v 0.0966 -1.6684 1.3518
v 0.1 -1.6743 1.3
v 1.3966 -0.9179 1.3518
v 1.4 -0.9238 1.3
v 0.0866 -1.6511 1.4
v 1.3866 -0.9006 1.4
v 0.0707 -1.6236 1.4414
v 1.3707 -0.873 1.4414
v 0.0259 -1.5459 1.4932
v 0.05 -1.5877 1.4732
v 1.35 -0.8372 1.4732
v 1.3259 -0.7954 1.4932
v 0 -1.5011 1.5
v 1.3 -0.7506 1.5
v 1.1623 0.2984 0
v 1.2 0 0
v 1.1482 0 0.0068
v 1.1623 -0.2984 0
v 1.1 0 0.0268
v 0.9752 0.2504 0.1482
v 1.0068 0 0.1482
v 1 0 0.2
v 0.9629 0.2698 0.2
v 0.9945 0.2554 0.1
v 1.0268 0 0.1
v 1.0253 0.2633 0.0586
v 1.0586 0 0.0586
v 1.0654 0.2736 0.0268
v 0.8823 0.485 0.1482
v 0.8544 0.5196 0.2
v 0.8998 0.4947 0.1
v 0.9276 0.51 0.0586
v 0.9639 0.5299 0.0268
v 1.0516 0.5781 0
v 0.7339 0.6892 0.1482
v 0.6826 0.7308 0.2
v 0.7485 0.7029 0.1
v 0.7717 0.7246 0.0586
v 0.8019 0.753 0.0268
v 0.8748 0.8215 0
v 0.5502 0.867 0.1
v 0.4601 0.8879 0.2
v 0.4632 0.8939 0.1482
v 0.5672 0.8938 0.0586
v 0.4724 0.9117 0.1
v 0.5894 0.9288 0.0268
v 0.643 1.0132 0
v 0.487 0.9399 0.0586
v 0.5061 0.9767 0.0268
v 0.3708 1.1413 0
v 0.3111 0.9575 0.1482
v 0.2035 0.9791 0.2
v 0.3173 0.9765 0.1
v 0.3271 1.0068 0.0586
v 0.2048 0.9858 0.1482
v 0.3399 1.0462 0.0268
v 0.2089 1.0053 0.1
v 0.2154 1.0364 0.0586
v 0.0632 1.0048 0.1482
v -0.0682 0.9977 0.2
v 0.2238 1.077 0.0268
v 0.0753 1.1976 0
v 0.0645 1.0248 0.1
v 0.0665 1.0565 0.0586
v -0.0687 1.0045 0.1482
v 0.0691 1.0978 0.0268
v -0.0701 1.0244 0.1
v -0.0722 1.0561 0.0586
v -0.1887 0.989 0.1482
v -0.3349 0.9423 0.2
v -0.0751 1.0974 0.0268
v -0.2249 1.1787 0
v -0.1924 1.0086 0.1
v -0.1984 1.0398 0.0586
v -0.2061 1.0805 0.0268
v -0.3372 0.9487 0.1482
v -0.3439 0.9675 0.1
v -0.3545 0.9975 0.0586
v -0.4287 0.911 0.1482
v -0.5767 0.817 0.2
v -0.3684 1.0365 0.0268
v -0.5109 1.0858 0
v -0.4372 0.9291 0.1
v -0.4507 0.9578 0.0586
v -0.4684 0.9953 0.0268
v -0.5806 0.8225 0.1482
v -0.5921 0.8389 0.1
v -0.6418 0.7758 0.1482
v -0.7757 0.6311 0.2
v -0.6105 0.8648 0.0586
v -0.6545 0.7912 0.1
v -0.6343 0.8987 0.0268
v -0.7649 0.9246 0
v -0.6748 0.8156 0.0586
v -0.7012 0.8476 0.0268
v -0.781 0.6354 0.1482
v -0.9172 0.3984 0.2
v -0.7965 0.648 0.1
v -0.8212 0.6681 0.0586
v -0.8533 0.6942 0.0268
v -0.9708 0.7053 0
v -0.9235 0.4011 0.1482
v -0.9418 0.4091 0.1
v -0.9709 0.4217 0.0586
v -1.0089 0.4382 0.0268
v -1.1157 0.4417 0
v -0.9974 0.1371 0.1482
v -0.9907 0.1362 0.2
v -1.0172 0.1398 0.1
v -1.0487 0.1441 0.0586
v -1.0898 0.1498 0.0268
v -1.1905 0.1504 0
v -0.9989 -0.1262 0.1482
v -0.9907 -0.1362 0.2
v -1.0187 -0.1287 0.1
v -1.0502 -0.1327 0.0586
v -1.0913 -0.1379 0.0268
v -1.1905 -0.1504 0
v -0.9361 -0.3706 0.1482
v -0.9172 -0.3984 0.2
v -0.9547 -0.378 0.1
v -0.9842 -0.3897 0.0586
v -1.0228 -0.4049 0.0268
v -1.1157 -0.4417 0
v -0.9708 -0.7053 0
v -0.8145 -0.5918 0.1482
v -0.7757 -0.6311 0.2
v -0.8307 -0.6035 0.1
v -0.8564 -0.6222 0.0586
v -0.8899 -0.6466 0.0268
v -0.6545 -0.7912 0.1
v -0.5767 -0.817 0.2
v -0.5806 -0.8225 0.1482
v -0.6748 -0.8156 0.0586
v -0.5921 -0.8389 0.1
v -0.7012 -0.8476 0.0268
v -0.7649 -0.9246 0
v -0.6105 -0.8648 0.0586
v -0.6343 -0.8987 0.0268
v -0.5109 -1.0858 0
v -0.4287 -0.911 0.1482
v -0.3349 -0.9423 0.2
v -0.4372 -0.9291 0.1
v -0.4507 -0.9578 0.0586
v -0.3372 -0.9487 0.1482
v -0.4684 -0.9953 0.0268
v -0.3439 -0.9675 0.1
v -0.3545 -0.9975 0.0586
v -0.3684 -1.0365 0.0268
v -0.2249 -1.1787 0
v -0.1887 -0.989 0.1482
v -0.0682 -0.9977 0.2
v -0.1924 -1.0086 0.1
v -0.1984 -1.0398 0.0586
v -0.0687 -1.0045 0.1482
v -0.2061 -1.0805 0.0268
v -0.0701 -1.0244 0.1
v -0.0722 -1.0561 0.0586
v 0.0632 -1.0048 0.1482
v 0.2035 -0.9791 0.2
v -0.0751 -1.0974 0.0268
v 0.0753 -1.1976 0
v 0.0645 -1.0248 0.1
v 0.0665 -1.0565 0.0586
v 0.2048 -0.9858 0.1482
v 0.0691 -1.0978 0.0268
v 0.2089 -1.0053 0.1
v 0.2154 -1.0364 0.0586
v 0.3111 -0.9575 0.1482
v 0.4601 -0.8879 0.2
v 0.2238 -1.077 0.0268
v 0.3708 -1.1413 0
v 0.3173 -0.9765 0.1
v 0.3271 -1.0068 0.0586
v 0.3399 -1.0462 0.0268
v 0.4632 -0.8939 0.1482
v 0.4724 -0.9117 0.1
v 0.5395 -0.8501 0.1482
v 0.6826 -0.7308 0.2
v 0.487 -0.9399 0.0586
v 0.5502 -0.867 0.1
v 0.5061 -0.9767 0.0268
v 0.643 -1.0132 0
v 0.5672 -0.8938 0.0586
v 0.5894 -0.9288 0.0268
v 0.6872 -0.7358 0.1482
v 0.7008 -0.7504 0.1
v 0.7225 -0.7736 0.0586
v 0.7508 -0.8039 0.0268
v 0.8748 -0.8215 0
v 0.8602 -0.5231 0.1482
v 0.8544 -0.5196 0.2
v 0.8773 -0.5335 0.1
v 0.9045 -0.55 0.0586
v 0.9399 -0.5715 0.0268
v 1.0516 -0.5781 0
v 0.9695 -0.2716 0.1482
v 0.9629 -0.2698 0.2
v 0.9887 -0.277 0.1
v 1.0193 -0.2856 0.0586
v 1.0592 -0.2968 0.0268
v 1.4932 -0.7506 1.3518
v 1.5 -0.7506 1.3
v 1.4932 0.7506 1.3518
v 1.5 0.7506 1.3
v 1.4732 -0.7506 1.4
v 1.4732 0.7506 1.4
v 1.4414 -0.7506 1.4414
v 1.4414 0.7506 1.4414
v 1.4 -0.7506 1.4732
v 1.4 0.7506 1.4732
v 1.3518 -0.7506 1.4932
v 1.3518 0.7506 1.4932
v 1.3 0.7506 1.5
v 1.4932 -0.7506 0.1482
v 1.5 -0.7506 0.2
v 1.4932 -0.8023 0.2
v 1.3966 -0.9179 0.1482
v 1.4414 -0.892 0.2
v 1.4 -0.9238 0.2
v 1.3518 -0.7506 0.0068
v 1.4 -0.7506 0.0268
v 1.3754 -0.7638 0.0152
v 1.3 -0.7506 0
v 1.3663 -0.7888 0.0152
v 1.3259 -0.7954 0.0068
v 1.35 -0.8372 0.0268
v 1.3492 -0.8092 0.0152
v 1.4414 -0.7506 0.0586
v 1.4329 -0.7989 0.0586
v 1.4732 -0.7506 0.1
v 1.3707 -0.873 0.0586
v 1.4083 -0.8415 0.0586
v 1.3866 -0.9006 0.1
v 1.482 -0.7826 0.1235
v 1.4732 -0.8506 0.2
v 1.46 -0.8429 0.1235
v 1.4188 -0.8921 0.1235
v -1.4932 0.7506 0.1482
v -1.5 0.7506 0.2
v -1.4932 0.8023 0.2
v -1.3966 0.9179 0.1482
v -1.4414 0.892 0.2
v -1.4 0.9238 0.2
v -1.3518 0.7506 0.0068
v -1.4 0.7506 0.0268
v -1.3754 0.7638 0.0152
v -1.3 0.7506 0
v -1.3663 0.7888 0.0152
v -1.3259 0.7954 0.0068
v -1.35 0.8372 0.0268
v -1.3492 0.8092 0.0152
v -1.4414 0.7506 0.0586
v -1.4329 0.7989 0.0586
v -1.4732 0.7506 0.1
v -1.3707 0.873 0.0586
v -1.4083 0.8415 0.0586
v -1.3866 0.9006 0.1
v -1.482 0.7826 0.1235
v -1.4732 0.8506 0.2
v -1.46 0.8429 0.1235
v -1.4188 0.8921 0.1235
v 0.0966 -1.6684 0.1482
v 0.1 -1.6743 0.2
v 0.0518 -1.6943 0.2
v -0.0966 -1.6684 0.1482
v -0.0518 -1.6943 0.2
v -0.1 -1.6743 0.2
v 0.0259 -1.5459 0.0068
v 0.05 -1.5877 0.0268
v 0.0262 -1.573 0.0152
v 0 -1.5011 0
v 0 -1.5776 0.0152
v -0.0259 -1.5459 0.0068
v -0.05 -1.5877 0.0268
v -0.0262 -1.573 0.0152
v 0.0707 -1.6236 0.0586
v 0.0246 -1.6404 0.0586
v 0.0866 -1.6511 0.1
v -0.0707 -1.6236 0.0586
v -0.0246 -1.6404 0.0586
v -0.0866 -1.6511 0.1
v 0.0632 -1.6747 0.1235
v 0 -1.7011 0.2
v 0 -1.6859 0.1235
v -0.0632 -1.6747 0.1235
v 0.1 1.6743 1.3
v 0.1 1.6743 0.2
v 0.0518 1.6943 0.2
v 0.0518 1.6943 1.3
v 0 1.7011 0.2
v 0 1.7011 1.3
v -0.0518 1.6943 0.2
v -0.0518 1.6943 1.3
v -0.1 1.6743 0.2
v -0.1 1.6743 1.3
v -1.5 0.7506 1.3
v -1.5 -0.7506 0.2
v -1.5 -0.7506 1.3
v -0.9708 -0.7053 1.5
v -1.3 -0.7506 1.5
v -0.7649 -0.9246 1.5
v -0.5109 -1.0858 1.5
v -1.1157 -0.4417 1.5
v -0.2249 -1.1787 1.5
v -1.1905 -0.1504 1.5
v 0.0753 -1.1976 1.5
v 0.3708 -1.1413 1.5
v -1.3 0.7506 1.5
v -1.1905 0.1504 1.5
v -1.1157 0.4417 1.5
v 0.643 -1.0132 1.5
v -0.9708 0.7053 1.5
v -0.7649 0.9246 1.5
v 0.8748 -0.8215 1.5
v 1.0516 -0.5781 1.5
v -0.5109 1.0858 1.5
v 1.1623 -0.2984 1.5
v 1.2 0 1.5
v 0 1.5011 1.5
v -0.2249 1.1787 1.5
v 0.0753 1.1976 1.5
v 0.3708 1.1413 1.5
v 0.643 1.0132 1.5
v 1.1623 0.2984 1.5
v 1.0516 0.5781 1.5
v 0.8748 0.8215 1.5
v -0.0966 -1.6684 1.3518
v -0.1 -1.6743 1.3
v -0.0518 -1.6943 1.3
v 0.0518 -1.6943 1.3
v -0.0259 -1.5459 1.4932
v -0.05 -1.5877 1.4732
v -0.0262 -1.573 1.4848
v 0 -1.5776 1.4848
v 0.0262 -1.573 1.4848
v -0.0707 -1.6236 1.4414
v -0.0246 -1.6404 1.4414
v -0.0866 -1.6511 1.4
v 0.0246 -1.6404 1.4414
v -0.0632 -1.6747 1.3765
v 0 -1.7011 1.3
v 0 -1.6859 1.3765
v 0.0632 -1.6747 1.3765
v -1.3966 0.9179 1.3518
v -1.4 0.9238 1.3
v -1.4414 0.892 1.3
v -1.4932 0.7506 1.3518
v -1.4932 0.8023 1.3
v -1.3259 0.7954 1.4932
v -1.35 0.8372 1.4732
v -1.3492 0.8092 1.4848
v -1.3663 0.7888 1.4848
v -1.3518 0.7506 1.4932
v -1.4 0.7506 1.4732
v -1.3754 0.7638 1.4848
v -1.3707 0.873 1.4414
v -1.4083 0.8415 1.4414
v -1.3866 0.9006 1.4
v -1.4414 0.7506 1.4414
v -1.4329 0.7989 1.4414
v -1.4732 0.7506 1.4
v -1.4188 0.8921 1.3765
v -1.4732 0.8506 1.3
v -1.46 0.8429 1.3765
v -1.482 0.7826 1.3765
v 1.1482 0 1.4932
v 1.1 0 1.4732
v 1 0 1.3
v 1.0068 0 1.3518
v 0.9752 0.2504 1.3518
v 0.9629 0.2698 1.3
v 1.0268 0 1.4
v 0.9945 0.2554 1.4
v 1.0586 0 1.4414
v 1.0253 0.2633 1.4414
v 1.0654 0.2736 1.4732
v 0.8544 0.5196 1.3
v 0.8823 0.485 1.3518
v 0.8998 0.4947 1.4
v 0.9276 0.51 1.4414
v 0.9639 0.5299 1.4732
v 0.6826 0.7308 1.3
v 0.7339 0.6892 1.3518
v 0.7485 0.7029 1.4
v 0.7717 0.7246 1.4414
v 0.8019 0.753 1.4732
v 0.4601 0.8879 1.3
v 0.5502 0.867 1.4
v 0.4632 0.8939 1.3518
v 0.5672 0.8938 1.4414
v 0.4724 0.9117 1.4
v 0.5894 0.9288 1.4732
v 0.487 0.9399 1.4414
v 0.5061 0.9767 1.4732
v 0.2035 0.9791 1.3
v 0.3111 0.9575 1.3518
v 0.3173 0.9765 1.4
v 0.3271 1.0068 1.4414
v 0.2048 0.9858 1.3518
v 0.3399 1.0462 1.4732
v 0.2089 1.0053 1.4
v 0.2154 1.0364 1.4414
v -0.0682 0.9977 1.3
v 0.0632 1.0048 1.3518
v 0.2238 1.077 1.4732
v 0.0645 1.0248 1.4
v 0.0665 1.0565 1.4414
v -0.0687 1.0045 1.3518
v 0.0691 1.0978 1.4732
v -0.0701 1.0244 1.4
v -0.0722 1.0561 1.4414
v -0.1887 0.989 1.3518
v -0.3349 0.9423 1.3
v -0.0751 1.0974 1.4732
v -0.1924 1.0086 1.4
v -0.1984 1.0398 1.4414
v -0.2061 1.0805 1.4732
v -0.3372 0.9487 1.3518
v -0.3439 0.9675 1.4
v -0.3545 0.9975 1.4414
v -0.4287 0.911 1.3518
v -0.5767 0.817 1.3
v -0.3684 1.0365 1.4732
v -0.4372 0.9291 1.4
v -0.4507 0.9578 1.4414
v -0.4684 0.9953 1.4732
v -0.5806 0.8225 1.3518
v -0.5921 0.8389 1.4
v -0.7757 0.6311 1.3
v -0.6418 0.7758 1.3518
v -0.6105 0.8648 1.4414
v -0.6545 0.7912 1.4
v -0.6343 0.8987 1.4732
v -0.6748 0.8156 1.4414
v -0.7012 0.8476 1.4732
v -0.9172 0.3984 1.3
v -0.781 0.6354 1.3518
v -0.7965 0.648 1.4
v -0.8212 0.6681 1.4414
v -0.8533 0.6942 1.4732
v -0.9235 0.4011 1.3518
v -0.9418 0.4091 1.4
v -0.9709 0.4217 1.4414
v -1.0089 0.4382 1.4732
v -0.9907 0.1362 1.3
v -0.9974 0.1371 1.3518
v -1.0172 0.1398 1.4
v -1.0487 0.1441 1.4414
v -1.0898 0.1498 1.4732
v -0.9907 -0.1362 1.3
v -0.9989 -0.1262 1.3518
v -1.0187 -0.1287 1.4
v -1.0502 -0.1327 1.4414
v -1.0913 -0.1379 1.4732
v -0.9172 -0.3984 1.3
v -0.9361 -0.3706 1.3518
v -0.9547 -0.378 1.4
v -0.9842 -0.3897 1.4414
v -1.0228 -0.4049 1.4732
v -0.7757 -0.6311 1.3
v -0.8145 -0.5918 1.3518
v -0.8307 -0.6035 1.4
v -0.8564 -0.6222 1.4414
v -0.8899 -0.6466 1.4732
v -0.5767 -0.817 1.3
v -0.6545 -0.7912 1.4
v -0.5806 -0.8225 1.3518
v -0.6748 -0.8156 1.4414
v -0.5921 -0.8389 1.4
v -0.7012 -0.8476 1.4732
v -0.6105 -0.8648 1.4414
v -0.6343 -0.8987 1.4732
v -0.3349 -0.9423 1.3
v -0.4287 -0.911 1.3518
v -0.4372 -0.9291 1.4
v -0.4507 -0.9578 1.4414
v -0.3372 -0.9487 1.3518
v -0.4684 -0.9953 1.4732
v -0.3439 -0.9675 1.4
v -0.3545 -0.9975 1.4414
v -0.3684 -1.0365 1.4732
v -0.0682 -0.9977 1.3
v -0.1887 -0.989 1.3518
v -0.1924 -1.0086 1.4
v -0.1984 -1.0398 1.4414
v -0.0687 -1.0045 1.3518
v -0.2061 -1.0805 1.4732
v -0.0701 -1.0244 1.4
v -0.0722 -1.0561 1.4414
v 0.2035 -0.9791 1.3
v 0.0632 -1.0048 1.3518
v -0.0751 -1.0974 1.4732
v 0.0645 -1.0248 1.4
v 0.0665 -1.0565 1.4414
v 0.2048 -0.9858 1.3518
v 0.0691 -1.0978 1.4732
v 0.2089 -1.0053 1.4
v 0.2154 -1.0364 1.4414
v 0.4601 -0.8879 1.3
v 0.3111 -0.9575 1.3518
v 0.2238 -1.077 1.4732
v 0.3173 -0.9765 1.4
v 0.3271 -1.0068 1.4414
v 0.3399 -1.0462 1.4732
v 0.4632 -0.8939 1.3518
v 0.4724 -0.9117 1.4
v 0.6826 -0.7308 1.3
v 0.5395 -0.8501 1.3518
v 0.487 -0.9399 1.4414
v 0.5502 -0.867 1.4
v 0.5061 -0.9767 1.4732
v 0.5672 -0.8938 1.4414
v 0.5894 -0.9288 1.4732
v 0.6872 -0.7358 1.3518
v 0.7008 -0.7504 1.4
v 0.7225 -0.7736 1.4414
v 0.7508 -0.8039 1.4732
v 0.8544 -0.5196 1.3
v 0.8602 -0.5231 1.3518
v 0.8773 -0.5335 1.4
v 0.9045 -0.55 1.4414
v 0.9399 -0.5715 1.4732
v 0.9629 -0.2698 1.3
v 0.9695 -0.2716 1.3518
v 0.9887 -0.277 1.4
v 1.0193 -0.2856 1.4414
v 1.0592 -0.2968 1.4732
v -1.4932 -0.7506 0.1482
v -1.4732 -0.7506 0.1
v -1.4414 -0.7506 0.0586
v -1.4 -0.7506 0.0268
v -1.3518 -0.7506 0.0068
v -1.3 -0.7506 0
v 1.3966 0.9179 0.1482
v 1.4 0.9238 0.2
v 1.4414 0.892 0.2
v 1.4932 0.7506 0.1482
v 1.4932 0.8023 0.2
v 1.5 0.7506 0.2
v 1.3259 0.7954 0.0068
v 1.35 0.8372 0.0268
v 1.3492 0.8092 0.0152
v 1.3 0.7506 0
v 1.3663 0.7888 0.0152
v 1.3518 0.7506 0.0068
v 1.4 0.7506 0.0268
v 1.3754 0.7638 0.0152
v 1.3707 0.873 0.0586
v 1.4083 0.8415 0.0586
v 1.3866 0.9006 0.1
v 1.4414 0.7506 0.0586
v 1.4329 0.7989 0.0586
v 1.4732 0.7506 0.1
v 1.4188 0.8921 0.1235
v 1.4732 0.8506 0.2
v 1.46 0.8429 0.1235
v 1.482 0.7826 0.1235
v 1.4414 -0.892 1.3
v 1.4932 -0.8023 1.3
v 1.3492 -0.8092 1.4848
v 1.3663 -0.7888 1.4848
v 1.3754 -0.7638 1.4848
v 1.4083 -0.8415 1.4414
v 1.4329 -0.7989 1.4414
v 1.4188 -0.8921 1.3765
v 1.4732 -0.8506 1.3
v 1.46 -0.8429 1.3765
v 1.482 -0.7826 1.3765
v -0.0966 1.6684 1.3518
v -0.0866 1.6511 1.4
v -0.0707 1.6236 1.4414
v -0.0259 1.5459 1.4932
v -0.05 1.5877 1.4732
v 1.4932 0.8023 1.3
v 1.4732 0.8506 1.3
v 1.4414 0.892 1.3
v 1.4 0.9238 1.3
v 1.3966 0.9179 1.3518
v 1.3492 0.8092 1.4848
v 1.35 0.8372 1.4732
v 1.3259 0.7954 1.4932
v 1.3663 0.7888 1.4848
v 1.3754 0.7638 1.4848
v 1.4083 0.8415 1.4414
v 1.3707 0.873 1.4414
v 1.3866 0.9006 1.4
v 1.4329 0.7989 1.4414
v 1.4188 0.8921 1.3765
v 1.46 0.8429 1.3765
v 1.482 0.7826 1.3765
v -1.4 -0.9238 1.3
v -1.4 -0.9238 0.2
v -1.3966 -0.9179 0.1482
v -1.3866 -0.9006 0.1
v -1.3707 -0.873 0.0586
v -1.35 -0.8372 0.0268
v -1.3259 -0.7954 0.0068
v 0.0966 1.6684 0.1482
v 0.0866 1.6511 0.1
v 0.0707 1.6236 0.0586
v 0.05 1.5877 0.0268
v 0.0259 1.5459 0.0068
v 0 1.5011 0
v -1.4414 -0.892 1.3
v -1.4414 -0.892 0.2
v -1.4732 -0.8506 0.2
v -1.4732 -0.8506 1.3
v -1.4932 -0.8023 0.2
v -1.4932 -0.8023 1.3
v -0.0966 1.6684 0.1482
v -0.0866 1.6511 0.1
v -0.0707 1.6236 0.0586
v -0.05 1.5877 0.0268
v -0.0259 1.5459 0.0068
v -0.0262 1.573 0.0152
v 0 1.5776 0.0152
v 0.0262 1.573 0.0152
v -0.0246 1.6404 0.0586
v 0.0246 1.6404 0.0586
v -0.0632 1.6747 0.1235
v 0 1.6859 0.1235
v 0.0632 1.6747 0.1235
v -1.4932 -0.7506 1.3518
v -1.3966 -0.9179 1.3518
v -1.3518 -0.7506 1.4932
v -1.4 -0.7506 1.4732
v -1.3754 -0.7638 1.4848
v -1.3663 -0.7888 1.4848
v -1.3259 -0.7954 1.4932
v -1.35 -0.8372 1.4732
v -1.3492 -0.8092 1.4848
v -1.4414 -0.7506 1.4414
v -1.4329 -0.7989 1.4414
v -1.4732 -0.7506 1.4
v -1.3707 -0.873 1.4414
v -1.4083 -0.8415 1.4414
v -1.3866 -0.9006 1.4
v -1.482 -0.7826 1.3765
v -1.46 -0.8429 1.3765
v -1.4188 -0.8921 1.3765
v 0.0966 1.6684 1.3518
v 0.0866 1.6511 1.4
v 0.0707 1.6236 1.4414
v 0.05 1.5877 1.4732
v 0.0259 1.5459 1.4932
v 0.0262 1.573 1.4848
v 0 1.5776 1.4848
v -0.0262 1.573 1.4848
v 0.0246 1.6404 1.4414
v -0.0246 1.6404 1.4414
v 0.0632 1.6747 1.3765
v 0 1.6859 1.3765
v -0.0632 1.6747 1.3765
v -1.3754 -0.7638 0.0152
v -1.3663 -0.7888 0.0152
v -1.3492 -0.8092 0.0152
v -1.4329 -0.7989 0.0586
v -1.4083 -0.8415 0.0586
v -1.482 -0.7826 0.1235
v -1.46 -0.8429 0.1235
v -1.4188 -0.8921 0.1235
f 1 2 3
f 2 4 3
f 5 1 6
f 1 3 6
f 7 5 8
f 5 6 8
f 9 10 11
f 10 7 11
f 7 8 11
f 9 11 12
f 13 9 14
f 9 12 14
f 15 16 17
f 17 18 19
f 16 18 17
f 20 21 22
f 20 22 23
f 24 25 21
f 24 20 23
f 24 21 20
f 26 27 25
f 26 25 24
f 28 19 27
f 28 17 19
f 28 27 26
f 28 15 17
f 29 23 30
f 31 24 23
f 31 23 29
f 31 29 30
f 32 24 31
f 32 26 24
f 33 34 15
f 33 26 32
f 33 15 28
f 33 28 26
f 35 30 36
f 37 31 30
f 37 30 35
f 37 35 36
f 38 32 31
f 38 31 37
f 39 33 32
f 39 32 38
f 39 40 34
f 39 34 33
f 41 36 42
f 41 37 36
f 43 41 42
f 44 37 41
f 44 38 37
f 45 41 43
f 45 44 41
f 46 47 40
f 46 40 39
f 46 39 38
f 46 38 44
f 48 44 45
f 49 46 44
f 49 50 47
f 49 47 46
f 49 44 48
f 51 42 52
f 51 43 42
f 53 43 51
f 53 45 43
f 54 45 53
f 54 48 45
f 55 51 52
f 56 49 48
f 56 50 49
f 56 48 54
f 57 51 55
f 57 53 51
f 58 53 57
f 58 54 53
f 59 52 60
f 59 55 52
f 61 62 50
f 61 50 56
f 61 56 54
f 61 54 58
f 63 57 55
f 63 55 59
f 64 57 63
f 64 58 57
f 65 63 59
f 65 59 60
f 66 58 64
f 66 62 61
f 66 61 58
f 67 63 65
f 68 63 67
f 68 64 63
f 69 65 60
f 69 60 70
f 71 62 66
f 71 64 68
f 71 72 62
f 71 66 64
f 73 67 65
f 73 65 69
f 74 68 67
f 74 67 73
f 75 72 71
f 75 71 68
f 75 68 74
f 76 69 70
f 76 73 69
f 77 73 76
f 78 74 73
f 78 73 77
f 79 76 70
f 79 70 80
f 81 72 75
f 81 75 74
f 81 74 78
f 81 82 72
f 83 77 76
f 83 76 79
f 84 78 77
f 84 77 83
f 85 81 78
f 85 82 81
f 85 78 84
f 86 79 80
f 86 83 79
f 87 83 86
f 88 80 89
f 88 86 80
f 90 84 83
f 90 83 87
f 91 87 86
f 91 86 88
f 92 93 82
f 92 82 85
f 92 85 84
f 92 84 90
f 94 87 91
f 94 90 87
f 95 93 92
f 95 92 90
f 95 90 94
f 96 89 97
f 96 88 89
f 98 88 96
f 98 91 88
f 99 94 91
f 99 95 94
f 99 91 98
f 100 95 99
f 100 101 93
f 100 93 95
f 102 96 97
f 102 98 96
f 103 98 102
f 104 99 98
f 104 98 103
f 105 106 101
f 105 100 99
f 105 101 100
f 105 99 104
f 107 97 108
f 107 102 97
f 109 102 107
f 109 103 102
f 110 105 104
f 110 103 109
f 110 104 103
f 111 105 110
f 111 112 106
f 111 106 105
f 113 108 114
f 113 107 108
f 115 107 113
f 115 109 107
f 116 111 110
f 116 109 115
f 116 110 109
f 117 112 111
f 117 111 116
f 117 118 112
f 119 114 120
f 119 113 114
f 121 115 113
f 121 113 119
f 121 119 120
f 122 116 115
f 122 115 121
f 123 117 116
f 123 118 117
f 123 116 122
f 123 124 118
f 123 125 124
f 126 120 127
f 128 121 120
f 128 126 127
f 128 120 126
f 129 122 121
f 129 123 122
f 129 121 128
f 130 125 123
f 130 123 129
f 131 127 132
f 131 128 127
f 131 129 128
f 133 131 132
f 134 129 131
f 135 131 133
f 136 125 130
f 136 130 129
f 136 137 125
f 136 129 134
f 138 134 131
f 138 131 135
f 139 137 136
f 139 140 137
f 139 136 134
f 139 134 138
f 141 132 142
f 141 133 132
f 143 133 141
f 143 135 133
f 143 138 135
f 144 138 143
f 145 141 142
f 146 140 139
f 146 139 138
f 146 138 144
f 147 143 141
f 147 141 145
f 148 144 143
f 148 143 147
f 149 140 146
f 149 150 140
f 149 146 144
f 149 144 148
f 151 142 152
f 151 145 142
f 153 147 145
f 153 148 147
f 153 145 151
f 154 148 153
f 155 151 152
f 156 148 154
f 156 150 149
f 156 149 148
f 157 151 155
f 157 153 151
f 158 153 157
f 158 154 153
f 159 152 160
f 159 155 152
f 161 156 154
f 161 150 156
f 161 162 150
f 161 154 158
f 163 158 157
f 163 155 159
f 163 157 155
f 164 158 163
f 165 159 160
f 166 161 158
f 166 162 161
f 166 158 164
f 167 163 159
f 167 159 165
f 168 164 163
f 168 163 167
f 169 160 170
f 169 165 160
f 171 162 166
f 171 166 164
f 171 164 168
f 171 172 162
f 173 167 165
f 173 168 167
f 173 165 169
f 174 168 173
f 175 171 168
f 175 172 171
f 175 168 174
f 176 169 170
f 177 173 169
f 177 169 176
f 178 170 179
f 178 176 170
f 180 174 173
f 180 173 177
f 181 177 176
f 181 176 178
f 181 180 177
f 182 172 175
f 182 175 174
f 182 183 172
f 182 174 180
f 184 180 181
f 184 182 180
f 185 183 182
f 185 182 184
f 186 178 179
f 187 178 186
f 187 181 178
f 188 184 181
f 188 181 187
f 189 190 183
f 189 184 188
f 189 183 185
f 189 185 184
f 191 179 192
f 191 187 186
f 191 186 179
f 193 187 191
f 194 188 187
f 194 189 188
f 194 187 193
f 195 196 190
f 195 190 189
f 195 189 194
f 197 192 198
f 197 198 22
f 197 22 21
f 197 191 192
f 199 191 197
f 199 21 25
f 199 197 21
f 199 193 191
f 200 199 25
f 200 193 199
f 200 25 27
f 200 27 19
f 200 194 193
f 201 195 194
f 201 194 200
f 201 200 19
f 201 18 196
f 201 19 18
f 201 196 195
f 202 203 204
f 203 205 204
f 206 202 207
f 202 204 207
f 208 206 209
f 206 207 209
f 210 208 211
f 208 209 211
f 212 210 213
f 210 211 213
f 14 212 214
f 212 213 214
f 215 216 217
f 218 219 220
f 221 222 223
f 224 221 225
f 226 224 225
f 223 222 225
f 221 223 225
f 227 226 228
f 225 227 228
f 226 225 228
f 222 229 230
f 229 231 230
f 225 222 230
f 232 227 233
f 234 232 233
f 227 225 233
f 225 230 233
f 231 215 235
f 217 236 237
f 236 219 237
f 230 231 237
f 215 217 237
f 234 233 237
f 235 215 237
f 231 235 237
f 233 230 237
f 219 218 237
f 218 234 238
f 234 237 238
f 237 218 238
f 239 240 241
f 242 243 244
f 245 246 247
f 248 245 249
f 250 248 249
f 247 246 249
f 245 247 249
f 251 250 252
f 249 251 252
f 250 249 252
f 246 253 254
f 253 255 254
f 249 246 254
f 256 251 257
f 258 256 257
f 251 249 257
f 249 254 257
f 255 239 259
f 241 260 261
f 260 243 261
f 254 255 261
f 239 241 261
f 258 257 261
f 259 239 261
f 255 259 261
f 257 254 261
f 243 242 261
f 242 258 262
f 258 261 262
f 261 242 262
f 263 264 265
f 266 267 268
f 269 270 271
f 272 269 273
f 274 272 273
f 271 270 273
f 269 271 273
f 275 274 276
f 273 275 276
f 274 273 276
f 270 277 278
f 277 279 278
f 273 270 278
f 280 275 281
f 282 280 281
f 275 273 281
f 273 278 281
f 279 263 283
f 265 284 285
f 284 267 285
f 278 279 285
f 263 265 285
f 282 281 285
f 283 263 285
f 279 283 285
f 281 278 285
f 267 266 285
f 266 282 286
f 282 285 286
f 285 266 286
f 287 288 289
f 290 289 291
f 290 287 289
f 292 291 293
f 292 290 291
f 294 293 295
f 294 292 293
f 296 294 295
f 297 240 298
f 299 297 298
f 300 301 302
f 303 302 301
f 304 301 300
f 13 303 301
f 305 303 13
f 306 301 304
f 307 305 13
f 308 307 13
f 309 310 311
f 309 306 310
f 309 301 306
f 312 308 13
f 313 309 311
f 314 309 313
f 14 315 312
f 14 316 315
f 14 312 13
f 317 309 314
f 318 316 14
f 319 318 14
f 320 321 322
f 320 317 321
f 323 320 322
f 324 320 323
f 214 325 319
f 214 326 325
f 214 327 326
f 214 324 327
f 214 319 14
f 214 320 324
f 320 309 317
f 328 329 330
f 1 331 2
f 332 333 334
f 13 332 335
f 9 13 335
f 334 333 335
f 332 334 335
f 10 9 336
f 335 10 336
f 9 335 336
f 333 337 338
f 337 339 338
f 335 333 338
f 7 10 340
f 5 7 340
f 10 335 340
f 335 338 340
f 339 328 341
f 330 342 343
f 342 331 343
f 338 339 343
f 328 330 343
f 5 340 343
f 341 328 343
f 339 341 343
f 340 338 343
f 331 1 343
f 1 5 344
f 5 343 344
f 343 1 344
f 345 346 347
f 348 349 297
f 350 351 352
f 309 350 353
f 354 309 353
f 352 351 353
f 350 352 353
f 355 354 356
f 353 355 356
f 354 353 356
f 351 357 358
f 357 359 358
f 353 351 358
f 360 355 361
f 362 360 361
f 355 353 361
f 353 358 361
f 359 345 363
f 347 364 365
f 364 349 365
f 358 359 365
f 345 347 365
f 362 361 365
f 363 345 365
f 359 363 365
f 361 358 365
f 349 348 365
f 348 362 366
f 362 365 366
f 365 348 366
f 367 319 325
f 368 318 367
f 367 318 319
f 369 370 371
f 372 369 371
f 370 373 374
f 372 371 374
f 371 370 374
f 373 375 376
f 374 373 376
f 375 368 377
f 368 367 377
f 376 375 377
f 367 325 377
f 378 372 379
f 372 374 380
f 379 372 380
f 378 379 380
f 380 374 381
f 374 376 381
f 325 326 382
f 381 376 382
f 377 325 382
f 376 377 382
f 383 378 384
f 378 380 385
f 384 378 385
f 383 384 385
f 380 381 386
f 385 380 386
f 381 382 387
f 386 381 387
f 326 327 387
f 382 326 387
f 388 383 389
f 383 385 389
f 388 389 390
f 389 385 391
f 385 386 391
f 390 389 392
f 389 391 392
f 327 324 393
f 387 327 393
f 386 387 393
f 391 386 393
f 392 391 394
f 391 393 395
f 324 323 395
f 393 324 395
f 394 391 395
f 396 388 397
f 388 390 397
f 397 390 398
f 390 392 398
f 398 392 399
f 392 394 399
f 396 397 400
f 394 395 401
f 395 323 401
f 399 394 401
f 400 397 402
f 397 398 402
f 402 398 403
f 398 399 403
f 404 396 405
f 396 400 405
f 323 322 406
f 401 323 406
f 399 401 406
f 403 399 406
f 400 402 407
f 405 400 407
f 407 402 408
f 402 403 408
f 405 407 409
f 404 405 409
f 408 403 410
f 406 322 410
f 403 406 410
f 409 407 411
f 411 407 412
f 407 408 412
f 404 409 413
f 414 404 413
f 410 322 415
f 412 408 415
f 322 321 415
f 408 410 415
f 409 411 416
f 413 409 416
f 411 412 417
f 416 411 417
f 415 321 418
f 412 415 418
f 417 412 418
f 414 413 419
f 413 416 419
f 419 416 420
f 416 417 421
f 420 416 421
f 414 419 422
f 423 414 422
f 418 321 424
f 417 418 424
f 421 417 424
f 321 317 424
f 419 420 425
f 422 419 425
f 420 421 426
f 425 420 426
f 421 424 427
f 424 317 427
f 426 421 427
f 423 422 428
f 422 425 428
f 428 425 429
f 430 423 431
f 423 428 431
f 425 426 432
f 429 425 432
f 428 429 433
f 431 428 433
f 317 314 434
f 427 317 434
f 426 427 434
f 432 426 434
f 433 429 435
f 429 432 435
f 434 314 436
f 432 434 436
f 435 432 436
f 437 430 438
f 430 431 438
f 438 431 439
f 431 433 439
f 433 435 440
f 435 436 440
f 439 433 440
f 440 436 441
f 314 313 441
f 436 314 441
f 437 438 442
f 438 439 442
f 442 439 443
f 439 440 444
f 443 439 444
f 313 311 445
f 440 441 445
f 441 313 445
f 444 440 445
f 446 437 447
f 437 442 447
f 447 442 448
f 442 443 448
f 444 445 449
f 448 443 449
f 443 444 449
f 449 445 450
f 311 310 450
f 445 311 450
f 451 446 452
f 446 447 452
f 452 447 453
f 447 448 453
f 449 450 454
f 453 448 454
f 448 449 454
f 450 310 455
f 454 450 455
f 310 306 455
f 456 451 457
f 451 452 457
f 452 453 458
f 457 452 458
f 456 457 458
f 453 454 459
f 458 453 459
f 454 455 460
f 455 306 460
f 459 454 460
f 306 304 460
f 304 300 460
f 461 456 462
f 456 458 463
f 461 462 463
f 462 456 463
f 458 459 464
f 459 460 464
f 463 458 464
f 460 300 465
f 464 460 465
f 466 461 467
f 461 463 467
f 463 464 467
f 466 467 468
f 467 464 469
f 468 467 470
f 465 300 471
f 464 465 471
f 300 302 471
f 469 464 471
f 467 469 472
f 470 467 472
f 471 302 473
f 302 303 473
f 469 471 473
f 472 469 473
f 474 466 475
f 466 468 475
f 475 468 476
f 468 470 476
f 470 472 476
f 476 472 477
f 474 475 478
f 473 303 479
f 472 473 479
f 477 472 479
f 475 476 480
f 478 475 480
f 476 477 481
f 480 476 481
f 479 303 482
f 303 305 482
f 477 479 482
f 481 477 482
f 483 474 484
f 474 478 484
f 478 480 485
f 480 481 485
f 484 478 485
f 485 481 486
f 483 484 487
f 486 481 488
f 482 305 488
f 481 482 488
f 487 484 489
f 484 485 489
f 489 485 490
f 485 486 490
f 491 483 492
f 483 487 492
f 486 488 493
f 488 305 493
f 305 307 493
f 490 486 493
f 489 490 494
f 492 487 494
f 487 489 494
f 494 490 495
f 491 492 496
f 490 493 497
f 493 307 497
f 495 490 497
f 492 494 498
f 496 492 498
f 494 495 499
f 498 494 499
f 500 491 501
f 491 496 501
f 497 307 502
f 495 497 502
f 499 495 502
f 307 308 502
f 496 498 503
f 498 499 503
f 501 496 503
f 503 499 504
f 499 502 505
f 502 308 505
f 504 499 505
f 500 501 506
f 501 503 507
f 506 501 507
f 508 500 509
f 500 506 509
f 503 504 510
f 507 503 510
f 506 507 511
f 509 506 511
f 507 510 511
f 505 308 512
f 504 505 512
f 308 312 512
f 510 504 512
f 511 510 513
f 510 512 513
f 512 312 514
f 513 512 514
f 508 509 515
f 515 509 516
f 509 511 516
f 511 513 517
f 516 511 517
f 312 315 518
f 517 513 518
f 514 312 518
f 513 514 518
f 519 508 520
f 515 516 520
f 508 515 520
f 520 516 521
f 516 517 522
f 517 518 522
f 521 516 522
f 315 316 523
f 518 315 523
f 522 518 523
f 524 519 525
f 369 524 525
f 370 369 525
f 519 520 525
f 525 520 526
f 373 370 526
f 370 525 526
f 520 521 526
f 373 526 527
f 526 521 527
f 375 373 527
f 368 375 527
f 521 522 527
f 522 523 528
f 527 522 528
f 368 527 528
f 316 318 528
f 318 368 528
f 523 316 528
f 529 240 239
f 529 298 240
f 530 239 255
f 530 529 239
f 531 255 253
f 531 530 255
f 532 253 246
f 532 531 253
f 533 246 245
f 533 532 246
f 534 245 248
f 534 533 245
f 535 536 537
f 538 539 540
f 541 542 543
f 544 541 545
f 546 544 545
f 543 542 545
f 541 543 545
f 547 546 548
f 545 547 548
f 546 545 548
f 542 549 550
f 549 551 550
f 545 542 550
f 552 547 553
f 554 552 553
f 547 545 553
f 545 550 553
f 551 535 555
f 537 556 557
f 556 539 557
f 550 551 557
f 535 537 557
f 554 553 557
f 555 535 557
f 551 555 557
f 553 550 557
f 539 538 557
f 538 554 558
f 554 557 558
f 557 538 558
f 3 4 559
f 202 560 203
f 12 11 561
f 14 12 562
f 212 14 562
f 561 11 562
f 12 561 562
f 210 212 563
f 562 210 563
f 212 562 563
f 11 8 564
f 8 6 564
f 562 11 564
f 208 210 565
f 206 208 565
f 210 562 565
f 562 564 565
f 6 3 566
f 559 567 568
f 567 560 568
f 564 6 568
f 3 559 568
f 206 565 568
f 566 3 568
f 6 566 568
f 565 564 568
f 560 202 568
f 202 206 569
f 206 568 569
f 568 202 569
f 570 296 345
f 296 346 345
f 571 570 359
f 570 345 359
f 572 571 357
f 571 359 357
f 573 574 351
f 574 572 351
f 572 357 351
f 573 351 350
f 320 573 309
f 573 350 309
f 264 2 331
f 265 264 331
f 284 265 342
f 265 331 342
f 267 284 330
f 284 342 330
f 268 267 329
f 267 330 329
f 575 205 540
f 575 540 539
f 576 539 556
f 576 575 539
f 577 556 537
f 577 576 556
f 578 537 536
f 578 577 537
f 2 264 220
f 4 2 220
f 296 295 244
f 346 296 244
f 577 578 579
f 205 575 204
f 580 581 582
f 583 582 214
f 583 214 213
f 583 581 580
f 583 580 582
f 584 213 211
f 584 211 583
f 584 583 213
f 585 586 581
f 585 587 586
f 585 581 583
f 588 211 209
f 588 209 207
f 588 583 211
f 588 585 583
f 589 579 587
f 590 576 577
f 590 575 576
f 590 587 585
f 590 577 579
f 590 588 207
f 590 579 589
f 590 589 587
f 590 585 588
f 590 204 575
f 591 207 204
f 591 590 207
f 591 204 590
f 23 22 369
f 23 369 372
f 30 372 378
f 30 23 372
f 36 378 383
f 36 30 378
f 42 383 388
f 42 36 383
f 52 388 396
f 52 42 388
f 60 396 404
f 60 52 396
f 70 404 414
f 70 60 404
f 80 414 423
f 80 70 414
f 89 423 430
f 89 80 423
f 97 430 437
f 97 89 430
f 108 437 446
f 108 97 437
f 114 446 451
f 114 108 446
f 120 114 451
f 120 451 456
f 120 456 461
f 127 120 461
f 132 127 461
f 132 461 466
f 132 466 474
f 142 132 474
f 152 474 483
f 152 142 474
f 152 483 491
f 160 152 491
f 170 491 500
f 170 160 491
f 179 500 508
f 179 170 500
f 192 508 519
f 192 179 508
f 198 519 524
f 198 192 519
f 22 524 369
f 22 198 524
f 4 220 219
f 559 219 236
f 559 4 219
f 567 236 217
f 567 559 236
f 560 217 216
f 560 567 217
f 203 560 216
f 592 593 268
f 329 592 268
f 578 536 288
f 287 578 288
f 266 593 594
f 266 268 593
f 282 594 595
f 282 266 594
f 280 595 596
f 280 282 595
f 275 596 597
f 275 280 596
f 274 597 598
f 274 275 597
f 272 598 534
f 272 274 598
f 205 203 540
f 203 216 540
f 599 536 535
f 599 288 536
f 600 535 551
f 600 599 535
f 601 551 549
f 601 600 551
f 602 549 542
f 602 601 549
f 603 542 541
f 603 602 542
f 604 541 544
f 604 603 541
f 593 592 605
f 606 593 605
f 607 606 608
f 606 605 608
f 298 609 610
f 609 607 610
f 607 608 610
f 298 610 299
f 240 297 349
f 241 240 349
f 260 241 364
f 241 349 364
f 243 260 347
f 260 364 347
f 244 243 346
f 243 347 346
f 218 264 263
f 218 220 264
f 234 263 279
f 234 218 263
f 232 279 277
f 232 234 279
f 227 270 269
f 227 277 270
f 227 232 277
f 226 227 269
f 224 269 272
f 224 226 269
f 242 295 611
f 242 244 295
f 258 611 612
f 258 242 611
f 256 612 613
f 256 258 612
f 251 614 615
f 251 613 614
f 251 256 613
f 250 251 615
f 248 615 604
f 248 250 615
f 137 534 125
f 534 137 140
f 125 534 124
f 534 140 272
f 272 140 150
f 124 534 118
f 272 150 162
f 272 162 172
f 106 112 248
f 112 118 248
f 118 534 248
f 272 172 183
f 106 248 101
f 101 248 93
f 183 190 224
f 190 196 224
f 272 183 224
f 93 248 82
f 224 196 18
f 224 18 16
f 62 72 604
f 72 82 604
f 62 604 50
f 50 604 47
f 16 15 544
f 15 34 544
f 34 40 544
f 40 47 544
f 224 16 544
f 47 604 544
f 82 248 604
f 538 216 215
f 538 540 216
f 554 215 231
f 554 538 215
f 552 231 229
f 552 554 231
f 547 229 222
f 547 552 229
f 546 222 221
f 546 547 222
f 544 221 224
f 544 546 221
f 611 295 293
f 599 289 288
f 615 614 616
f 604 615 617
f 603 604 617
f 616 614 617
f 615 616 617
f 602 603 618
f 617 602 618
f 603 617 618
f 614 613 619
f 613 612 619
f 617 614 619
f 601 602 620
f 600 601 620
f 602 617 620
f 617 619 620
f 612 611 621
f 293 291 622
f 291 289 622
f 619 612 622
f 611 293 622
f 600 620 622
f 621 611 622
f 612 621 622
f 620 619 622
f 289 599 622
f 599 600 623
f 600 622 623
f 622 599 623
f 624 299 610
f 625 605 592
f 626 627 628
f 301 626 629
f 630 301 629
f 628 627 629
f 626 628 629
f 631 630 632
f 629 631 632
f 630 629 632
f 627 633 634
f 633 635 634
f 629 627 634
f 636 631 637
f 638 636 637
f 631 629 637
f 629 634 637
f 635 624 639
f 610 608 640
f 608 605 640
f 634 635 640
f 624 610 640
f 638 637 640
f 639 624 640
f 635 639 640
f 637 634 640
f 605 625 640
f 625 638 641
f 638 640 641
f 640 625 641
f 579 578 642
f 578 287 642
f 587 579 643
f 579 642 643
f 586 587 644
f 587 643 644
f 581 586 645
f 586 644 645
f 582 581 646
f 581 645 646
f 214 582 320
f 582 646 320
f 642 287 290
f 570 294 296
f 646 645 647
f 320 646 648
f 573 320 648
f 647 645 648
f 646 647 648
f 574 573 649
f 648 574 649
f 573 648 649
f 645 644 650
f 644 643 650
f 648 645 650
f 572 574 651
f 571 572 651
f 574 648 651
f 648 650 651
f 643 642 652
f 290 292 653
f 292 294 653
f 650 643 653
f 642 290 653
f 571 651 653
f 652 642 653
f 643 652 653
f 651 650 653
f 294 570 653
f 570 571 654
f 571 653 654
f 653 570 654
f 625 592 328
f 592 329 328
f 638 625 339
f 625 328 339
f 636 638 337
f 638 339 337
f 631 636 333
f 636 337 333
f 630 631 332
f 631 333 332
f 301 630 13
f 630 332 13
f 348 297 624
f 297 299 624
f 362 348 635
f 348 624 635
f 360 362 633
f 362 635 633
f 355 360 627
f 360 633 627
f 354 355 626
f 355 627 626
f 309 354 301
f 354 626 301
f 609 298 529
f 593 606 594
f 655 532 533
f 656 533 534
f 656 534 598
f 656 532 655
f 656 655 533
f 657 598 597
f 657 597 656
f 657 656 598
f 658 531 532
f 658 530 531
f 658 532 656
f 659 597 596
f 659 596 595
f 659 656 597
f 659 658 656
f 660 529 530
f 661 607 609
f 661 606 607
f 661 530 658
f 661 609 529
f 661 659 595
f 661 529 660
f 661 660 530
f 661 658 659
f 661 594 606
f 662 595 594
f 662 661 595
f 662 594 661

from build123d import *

# Parameters (mm, degrees)
SKETCH1_R      = 1
EXTRUDE1_DEPTH = 1.5
FILLET1_R      = 0.2


with BuildPart() as part:
    # Sketch1 → Extrude1 (new body)
    with BuildSketch(Plane.XY):
        Polygon((0, -1.732050808), (1.5, -0.866025404), (1.5, 0.866025404), (0, 1.732050808), (-1.5, 0.866025404), (-1.5, -0.866025404), align=None)
        Circle(SKETCH1_R, mode=Mode.SUBTRACT)
    extrude(amount=EXTRUDE1_DEPTH)

    # Fillet1
    fillet1_edges = [part.edges().sort_by_distance(p)[0] for p in [
        (1.5, 0, 1.5),
        (-1.5, -0.866025404, 0.75),
        (-1.5, 0.866025404, 0.75),
        (0, 1.732050808, 0.75),
        (1.5, 0.866025404, 0.75),
        (1.5, -0.866025404, 0.75),
        (0, -1.732050808, 0.75),
        (0.75, 1.299038106, 1.5),
        (-0.75, 1.299038106, 1.5),
        (-1, 0, 0),
        (-1, 0, 1.5),
        (-1.5, 0, 1.5),
        (-0.75, -1.299038106, 1.5),
        (-1.5, 0, 0),
        (-0.75, 1.299038106, 0),
        (0.75, 1.299038106, 0),
        (0.75, -1.299038106, 1.5),
        (1.5, 0, 0),
        (0.75, -1.299038106, 0),
        (-0.75, -1.299038106, 0),
    ]]
    fillet(fillet1_edges, radius=FILLET1_R)


solid = part.part
